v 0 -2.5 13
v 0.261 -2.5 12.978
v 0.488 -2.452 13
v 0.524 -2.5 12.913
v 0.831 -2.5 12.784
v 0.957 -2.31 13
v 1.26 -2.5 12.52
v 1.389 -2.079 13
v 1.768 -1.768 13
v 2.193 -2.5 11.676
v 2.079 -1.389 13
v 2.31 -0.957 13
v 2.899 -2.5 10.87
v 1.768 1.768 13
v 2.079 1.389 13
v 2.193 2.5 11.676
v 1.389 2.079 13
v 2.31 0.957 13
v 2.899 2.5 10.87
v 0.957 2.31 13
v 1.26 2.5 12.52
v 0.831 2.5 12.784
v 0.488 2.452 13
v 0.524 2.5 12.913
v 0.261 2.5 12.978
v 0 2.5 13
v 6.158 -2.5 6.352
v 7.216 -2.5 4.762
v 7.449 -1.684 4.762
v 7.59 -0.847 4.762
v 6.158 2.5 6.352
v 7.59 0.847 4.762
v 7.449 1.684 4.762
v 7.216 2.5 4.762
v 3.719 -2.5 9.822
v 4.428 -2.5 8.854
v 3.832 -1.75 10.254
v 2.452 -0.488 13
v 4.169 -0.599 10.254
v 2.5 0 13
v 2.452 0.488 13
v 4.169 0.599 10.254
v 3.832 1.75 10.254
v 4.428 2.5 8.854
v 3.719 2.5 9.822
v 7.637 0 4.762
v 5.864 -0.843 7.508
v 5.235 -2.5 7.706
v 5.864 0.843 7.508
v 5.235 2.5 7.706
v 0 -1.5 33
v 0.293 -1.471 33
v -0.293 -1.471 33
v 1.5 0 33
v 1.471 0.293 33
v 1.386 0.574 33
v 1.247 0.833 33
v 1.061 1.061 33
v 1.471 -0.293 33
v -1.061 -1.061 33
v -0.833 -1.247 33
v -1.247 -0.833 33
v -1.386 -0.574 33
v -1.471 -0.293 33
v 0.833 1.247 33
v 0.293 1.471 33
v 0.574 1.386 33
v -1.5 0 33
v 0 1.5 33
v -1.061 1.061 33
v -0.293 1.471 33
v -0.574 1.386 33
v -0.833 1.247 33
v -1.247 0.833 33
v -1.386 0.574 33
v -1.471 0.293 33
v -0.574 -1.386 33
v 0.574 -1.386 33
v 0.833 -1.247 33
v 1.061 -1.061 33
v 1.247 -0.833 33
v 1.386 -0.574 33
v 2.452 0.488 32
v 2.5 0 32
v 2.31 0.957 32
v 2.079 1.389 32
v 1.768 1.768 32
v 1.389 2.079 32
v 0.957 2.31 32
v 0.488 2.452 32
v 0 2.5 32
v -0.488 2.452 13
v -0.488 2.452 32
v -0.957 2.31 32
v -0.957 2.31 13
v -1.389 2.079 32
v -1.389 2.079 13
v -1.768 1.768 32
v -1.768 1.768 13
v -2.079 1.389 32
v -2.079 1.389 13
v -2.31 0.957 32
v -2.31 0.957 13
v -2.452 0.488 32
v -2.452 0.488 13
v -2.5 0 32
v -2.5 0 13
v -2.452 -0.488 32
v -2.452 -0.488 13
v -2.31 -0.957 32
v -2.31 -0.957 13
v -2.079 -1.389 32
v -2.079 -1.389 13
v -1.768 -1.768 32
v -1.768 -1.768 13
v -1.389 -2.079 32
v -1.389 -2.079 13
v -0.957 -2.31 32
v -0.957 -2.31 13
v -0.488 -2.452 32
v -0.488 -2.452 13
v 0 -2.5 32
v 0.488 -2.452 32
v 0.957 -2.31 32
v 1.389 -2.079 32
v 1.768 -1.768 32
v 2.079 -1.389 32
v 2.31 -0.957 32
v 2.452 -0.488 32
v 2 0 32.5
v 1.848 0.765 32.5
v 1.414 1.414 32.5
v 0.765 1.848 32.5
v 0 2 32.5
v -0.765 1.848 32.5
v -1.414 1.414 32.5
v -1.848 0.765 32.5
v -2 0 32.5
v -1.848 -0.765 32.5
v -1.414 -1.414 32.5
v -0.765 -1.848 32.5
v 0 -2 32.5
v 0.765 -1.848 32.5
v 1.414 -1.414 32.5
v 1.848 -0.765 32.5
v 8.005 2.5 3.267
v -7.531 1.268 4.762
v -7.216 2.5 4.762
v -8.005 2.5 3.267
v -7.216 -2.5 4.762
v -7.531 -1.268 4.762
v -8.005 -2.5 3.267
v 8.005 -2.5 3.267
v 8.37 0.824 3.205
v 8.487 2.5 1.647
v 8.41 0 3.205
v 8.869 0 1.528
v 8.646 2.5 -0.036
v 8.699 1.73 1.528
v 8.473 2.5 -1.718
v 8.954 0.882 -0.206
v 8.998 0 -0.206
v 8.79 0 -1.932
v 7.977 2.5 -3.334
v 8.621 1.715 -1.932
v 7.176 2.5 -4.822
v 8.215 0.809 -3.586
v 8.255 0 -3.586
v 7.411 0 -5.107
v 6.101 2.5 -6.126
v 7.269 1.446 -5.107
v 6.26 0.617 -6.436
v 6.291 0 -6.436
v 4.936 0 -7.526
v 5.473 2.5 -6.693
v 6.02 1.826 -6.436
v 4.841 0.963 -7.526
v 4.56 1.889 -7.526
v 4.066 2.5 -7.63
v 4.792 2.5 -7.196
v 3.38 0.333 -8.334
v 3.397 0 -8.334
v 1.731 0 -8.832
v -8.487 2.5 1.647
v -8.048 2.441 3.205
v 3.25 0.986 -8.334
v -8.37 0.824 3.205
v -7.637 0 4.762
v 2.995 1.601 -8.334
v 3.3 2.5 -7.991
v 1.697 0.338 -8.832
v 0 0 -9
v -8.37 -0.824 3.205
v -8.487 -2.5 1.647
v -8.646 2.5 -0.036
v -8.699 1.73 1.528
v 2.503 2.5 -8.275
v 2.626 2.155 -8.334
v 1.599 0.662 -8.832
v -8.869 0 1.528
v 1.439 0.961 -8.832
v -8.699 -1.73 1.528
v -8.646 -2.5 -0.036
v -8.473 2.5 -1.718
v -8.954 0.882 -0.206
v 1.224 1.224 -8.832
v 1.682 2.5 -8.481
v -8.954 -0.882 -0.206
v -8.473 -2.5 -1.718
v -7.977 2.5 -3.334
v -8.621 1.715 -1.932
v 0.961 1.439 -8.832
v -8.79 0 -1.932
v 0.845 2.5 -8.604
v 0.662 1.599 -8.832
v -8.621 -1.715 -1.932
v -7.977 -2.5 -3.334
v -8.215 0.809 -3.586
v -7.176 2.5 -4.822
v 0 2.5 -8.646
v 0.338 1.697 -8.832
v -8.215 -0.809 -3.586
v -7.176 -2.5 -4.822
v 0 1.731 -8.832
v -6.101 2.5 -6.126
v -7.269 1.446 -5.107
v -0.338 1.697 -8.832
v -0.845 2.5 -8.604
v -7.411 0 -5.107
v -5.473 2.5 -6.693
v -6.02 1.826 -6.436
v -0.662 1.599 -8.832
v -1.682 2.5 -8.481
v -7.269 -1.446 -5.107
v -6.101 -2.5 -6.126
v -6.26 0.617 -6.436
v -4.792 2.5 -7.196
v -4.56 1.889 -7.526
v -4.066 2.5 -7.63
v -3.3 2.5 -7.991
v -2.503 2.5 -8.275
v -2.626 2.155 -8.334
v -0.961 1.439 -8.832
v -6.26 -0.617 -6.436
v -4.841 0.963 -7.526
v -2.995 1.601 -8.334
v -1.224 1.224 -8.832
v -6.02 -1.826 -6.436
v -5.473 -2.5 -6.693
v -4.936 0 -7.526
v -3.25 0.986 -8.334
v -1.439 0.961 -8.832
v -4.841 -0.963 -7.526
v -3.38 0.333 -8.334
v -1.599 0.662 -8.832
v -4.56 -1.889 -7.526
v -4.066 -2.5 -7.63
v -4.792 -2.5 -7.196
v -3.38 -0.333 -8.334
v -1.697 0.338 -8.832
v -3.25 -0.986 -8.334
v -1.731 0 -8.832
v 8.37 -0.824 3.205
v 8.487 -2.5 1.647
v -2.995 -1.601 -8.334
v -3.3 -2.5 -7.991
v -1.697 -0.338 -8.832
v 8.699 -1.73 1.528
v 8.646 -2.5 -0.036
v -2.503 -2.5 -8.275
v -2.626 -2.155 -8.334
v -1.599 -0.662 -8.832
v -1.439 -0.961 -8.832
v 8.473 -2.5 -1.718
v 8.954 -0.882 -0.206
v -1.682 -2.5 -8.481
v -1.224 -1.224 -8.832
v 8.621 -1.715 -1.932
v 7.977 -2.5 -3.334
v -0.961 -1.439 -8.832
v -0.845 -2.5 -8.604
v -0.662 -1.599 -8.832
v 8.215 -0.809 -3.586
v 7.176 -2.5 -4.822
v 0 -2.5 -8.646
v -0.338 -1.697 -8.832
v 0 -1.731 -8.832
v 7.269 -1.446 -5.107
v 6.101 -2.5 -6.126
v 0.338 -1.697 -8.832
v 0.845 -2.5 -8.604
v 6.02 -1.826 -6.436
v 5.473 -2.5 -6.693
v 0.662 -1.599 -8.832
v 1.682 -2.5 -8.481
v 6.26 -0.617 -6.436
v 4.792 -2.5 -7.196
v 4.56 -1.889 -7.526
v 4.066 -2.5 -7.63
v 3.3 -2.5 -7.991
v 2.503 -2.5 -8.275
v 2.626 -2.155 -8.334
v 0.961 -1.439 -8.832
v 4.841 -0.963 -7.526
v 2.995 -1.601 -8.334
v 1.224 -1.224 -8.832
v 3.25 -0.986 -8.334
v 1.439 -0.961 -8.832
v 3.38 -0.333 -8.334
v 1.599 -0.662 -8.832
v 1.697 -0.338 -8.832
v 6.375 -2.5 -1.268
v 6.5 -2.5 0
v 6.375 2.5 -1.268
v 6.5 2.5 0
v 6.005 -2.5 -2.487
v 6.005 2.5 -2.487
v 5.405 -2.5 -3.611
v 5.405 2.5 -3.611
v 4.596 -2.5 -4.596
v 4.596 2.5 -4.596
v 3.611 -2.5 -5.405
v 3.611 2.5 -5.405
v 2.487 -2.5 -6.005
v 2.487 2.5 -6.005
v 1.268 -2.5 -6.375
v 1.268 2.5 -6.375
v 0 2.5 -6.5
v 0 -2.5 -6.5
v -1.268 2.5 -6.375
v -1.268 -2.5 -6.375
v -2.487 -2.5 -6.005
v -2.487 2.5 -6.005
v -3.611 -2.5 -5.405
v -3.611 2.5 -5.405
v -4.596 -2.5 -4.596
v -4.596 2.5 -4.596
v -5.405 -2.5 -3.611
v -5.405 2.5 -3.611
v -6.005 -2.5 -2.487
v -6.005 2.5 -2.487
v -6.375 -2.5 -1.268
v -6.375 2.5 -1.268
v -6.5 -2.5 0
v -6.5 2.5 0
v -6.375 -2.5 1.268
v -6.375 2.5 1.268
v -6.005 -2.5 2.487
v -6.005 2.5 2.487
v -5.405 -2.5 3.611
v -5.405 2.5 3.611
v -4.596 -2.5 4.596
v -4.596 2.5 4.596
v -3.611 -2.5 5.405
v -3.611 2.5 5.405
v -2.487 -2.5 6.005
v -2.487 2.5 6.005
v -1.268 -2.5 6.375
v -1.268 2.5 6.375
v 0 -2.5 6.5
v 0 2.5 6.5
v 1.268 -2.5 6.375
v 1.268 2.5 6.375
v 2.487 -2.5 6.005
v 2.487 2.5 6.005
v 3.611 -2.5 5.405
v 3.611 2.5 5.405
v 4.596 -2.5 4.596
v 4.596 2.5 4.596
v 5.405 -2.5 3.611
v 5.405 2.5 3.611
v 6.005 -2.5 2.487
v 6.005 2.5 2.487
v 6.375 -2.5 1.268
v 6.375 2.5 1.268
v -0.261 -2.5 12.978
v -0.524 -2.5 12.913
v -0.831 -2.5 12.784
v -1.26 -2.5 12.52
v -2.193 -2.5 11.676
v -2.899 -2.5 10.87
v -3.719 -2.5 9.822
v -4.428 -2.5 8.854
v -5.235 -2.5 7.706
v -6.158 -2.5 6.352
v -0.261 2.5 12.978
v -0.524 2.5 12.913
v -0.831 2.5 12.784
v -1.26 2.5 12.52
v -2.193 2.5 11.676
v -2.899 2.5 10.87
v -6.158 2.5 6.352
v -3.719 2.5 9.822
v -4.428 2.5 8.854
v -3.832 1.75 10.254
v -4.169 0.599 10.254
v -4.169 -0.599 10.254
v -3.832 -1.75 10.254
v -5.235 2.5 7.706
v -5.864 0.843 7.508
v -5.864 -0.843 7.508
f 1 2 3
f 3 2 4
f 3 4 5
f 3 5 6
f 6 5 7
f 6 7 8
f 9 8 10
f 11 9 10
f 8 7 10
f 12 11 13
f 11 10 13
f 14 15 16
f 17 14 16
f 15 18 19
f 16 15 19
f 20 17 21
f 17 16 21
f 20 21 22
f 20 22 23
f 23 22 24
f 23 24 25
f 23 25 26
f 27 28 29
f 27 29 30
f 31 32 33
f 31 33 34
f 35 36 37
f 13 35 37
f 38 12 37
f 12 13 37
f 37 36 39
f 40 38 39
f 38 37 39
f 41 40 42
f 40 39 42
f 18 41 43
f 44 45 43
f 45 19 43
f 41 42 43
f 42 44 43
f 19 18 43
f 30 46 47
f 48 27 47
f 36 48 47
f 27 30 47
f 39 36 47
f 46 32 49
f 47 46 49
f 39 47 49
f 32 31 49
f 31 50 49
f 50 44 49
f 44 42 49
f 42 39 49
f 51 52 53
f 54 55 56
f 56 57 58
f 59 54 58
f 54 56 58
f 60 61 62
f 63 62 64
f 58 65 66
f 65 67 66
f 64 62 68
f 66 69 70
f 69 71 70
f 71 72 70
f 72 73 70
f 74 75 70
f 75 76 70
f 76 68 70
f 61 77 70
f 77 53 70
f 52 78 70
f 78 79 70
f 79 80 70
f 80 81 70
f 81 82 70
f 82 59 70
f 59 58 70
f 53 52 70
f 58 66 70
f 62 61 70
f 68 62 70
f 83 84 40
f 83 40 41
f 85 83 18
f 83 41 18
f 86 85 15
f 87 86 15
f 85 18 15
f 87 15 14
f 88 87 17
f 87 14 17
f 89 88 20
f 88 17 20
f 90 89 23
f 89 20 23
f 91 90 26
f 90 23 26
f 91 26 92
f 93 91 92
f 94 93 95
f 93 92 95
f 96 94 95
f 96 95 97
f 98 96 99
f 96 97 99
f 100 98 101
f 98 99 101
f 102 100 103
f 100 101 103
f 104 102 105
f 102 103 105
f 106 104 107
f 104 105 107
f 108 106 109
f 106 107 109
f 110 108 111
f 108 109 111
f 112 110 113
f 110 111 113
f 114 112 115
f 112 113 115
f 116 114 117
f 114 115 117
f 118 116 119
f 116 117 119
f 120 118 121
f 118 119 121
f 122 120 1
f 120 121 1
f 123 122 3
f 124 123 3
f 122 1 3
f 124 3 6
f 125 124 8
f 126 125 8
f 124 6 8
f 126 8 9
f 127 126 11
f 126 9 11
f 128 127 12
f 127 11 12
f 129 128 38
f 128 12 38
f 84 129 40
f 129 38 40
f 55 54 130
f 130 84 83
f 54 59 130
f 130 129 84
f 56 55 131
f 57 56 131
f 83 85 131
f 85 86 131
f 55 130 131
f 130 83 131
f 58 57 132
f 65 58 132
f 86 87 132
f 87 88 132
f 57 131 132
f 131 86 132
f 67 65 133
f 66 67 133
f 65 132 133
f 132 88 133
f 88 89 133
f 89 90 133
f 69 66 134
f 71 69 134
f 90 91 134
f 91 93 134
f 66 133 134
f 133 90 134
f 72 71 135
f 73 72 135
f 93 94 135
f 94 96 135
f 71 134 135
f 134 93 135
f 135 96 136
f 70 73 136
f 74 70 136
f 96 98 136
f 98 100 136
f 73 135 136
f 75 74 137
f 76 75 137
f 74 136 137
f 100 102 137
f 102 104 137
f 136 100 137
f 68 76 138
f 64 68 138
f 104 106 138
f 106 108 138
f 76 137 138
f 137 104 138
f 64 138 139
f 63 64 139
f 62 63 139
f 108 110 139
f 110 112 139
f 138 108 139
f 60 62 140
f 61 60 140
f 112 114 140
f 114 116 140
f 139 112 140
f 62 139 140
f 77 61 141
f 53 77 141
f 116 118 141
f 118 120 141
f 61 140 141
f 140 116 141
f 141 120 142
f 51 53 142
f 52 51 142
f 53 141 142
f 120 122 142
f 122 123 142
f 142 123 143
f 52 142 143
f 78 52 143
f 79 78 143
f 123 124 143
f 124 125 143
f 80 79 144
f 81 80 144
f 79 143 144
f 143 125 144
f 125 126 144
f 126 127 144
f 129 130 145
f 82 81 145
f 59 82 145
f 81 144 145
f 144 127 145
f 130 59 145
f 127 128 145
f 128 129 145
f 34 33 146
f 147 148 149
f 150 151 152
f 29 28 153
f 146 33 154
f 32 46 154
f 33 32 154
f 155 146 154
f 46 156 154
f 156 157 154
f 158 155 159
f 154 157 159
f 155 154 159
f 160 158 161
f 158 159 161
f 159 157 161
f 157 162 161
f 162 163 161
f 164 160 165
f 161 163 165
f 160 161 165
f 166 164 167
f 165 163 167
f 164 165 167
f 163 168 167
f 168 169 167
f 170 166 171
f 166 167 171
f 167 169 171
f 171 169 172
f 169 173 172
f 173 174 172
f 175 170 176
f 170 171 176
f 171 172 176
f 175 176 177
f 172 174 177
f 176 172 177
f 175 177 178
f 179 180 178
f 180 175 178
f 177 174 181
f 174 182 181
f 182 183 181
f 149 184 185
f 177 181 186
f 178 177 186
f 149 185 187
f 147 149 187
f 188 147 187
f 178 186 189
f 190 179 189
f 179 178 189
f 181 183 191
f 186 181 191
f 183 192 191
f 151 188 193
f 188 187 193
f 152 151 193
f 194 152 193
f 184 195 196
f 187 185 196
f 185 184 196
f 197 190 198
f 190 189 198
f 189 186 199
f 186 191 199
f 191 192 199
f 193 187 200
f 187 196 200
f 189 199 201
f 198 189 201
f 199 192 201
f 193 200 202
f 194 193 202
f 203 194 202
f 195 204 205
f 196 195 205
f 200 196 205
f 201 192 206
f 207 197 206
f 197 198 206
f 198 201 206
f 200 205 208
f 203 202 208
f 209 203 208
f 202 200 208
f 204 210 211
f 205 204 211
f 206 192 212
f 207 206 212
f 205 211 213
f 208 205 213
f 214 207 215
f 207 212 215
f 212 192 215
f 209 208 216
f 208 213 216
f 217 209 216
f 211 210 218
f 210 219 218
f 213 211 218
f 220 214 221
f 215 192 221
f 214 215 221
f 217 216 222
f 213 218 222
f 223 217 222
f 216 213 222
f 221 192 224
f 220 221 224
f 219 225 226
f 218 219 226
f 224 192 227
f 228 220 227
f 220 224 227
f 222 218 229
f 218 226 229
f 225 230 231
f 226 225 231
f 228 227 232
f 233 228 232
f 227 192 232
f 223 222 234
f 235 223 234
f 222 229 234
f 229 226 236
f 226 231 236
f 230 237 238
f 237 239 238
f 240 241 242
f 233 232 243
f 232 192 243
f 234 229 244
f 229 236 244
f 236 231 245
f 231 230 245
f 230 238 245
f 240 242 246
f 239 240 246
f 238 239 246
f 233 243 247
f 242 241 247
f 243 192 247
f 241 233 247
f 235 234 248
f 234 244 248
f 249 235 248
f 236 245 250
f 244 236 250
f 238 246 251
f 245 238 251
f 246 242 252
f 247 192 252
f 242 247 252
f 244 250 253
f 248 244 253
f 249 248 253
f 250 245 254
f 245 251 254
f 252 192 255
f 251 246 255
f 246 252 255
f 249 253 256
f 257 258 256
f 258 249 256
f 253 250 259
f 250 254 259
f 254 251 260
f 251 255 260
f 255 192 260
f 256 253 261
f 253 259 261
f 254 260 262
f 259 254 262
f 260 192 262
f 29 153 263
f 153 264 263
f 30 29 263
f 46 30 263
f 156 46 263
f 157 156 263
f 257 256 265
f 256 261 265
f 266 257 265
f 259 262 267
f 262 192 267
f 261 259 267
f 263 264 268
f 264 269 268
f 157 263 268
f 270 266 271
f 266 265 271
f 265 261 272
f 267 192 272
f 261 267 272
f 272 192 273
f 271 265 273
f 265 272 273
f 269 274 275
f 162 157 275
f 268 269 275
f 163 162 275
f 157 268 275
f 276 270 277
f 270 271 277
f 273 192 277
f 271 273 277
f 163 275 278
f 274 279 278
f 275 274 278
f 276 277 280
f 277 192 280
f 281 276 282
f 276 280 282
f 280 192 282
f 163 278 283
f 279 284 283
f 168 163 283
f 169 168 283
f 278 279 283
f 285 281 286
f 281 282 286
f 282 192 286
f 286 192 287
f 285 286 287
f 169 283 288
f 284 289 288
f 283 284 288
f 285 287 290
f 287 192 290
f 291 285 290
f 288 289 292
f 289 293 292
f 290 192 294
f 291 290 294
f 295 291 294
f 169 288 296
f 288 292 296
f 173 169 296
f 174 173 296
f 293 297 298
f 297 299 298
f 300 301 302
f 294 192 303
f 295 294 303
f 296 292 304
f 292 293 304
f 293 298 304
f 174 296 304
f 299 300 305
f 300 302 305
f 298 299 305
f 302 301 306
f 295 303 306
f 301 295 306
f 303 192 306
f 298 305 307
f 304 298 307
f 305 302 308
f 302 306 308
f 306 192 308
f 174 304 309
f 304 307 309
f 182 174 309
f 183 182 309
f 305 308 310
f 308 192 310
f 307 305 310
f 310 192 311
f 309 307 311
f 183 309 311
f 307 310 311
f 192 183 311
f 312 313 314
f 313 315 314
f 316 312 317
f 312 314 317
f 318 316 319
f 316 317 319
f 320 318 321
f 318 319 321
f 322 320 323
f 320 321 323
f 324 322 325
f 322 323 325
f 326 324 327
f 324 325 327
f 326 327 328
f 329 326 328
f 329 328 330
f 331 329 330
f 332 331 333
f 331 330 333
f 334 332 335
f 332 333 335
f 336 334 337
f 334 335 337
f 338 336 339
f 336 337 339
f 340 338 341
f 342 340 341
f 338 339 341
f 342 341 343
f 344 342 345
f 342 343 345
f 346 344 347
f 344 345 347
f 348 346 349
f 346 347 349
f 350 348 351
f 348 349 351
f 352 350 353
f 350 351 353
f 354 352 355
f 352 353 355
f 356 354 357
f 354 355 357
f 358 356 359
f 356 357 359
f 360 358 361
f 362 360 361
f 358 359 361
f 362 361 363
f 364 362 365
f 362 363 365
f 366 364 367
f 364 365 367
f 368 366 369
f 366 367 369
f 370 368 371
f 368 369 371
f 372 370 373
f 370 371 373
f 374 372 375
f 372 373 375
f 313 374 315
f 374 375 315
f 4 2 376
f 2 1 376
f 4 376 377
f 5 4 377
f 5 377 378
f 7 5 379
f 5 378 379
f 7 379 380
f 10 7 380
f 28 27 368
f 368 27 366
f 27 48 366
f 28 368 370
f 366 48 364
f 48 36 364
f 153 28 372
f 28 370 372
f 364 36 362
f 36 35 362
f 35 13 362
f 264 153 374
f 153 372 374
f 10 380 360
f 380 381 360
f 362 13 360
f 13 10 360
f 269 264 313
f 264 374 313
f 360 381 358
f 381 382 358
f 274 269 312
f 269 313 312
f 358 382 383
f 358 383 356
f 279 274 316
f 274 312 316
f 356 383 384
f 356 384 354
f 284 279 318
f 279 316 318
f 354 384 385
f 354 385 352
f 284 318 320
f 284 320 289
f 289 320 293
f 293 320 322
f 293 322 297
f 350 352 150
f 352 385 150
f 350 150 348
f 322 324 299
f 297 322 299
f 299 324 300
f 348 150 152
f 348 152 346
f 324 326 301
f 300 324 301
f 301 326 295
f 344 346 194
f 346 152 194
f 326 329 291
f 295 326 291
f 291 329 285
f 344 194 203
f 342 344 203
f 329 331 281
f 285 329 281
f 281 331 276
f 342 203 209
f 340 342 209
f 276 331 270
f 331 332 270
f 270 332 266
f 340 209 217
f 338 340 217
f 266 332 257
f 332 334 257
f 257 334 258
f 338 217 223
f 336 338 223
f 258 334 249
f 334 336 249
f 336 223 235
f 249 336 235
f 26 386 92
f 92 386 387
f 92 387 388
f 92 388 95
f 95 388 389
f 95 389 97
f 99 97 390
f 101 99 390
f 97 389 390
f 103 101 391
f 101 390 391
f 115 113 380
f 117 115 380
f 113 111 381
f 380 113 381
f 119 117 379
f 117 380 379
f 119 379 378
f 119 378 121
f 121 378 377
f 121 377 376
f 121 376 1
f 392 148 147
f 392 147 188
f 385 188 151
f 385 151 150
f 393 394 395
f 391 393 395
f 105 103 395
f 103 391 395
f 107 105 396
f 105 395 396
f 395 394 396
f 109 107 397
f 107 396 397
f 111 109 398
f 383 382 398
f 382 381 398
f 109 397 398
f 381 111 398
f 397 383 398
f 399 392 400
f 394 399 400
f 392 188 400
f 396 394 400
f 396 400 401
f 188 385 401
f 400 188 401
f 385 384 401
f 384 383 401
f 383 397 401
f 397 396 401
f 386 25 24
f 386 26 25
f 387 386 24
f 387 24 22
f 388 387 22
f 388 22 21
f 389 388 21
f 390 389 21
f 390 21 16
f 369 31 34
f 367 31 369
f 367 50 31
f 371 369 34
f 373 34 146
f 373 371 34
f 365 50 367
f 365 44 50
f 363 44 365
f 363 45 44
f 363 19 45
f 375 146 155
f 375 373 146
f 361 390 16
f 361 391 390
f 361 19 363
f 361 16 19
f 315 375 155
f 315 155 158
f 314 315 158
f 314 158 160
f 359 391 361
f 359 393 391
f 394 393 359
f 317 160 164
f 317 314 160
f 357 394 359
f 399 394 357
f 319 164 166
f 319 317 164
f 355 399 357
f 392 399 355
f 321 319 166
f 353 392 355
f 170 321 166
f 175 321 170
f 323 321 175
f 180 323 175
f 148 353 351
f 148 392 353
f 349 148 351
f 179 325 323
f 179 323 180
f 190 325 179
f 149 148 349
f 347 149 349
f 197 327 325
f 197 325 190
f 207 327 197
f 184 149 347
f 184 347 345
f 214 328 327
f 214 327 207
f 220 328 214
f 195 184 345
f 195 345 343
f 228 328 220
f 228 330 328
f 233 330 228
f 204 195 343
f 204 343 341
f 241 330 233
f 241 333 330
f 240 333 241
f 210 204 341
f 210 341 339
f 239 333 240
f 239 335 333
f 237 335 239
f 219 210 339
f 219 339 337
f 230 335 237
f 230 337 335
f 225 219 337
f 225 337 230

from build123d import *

# Parameters (mm, degrees)
SZKIC1_W                        = 2.5
SZKIC1_H                        = 20
WYTNIJ_WYCI_GNI_CIE1_DEPTH      = 10
WYTNIJ_WYCI_GNI_CIE1_DEPTH_BACK = 10
SZKIC3_R                        = 6.5
WYTNIJ_WYCI_GNI_CIE2_DEPTH      = 3.5
WYTNIJ_WYCI_GNI_CIE2_DEPTH_BACK = 3.5
SFAZOWANIE1_SIZE                = 1


with BuildPart() as part:
    # Szkic1 → Obrót1 (revolve)
    with BuildSketch(Plane(origin=(0, 0, 0), x_dir=(1, 0, 0), z_dir=(0, 1, 0))):
        with BuildLine():
            Line((0, 9), (0, -13))
            Line((0, -13), (2.5, -13))
            Line((2.5, -13), (7.636887524, -4.762137015))
            ThreePointArc((7.636887524, -4.762137015), (7.869537252, 4.366965014), (0, 9))
        make_face()
        with Locations((1.25, -23)):
            Rectangle(SZKIC1_W, SZKIC1_H)
    revolve(axis=Axis((0, 0, -26.043516498), (0, 0, 1)))

    # Szkic2 → Wytnij-wyciągnięcie1 (cut, two sides)
    with BuildSketch(Plane(origin=(0, 0, 0), x_dir=(0, 0, -1), z_dir=(1, 0, 0))) as wytnij_wyci_gni_cie1_sk:
        with BuildLine():
            Line((-13, 2.5), (8.645808233, 2.5))
            ThreePointArc((8.645808233, 2.5), (3.21988026, 8.4043067), (-4.762137015, 7.636887524))
            Line((-4.762137015, 7.636887524), (-13, 2.5))
        make_face()
        with BuildLine():
            Line((-13, -2.5), (8.645808233, -2.5))
            ThreePointArc((8.645808233, -2.5), (3.21988026, -8.4043067), (-4.762137015, -7.636887524))
            Line((-4.762137015, -7.636887524), (-13, -2.5))
        make_face()
    extrude(amount=WYTNIJ_WYCI_GNI_CIE1_DEPTH, mode=Mode.SUBTRACT)
    extrude(wytnij_wyci_gni_cie1_sk.sketch, amount=-WYTNIJ_WYCI_GNI_CIE1_DEPTH_BACK, mode=Mode.SUBTRACT)

    # Szkic3 → Wytnij-wyciągnięcie2 (cut, two sides)
    with BuildSketch(Plane(origin=(0, 0, 0), x_dir=(1, 0, 0), z_dir=(0, 1, 0))) as wytnij_wyci_gni_cie2_sk:
        Circle(SZKIC3_R)
    extrude(amount=WYTNIJ_WYCI_GNI_CIE2_DEPTH, mode=Mode.SUBTRACT)
    extrude(wytnij_wyci_gni_cie2_sk.sketch, amount=-WYTNIJ_WYCI_GNI_CIE2_DEPTH_BACK, mode=Mode.SUBTRACT)

    # Sfazowanie1
    sfazowanie1_edges = [part.edges().sort_by_distance(p)[0] for p in [
        (-2.5, 0, 33),
    ]]
    chamfer(sfazowanie1_edges, length=SFAZOWANIE1_SIZE)


solid = part.part
